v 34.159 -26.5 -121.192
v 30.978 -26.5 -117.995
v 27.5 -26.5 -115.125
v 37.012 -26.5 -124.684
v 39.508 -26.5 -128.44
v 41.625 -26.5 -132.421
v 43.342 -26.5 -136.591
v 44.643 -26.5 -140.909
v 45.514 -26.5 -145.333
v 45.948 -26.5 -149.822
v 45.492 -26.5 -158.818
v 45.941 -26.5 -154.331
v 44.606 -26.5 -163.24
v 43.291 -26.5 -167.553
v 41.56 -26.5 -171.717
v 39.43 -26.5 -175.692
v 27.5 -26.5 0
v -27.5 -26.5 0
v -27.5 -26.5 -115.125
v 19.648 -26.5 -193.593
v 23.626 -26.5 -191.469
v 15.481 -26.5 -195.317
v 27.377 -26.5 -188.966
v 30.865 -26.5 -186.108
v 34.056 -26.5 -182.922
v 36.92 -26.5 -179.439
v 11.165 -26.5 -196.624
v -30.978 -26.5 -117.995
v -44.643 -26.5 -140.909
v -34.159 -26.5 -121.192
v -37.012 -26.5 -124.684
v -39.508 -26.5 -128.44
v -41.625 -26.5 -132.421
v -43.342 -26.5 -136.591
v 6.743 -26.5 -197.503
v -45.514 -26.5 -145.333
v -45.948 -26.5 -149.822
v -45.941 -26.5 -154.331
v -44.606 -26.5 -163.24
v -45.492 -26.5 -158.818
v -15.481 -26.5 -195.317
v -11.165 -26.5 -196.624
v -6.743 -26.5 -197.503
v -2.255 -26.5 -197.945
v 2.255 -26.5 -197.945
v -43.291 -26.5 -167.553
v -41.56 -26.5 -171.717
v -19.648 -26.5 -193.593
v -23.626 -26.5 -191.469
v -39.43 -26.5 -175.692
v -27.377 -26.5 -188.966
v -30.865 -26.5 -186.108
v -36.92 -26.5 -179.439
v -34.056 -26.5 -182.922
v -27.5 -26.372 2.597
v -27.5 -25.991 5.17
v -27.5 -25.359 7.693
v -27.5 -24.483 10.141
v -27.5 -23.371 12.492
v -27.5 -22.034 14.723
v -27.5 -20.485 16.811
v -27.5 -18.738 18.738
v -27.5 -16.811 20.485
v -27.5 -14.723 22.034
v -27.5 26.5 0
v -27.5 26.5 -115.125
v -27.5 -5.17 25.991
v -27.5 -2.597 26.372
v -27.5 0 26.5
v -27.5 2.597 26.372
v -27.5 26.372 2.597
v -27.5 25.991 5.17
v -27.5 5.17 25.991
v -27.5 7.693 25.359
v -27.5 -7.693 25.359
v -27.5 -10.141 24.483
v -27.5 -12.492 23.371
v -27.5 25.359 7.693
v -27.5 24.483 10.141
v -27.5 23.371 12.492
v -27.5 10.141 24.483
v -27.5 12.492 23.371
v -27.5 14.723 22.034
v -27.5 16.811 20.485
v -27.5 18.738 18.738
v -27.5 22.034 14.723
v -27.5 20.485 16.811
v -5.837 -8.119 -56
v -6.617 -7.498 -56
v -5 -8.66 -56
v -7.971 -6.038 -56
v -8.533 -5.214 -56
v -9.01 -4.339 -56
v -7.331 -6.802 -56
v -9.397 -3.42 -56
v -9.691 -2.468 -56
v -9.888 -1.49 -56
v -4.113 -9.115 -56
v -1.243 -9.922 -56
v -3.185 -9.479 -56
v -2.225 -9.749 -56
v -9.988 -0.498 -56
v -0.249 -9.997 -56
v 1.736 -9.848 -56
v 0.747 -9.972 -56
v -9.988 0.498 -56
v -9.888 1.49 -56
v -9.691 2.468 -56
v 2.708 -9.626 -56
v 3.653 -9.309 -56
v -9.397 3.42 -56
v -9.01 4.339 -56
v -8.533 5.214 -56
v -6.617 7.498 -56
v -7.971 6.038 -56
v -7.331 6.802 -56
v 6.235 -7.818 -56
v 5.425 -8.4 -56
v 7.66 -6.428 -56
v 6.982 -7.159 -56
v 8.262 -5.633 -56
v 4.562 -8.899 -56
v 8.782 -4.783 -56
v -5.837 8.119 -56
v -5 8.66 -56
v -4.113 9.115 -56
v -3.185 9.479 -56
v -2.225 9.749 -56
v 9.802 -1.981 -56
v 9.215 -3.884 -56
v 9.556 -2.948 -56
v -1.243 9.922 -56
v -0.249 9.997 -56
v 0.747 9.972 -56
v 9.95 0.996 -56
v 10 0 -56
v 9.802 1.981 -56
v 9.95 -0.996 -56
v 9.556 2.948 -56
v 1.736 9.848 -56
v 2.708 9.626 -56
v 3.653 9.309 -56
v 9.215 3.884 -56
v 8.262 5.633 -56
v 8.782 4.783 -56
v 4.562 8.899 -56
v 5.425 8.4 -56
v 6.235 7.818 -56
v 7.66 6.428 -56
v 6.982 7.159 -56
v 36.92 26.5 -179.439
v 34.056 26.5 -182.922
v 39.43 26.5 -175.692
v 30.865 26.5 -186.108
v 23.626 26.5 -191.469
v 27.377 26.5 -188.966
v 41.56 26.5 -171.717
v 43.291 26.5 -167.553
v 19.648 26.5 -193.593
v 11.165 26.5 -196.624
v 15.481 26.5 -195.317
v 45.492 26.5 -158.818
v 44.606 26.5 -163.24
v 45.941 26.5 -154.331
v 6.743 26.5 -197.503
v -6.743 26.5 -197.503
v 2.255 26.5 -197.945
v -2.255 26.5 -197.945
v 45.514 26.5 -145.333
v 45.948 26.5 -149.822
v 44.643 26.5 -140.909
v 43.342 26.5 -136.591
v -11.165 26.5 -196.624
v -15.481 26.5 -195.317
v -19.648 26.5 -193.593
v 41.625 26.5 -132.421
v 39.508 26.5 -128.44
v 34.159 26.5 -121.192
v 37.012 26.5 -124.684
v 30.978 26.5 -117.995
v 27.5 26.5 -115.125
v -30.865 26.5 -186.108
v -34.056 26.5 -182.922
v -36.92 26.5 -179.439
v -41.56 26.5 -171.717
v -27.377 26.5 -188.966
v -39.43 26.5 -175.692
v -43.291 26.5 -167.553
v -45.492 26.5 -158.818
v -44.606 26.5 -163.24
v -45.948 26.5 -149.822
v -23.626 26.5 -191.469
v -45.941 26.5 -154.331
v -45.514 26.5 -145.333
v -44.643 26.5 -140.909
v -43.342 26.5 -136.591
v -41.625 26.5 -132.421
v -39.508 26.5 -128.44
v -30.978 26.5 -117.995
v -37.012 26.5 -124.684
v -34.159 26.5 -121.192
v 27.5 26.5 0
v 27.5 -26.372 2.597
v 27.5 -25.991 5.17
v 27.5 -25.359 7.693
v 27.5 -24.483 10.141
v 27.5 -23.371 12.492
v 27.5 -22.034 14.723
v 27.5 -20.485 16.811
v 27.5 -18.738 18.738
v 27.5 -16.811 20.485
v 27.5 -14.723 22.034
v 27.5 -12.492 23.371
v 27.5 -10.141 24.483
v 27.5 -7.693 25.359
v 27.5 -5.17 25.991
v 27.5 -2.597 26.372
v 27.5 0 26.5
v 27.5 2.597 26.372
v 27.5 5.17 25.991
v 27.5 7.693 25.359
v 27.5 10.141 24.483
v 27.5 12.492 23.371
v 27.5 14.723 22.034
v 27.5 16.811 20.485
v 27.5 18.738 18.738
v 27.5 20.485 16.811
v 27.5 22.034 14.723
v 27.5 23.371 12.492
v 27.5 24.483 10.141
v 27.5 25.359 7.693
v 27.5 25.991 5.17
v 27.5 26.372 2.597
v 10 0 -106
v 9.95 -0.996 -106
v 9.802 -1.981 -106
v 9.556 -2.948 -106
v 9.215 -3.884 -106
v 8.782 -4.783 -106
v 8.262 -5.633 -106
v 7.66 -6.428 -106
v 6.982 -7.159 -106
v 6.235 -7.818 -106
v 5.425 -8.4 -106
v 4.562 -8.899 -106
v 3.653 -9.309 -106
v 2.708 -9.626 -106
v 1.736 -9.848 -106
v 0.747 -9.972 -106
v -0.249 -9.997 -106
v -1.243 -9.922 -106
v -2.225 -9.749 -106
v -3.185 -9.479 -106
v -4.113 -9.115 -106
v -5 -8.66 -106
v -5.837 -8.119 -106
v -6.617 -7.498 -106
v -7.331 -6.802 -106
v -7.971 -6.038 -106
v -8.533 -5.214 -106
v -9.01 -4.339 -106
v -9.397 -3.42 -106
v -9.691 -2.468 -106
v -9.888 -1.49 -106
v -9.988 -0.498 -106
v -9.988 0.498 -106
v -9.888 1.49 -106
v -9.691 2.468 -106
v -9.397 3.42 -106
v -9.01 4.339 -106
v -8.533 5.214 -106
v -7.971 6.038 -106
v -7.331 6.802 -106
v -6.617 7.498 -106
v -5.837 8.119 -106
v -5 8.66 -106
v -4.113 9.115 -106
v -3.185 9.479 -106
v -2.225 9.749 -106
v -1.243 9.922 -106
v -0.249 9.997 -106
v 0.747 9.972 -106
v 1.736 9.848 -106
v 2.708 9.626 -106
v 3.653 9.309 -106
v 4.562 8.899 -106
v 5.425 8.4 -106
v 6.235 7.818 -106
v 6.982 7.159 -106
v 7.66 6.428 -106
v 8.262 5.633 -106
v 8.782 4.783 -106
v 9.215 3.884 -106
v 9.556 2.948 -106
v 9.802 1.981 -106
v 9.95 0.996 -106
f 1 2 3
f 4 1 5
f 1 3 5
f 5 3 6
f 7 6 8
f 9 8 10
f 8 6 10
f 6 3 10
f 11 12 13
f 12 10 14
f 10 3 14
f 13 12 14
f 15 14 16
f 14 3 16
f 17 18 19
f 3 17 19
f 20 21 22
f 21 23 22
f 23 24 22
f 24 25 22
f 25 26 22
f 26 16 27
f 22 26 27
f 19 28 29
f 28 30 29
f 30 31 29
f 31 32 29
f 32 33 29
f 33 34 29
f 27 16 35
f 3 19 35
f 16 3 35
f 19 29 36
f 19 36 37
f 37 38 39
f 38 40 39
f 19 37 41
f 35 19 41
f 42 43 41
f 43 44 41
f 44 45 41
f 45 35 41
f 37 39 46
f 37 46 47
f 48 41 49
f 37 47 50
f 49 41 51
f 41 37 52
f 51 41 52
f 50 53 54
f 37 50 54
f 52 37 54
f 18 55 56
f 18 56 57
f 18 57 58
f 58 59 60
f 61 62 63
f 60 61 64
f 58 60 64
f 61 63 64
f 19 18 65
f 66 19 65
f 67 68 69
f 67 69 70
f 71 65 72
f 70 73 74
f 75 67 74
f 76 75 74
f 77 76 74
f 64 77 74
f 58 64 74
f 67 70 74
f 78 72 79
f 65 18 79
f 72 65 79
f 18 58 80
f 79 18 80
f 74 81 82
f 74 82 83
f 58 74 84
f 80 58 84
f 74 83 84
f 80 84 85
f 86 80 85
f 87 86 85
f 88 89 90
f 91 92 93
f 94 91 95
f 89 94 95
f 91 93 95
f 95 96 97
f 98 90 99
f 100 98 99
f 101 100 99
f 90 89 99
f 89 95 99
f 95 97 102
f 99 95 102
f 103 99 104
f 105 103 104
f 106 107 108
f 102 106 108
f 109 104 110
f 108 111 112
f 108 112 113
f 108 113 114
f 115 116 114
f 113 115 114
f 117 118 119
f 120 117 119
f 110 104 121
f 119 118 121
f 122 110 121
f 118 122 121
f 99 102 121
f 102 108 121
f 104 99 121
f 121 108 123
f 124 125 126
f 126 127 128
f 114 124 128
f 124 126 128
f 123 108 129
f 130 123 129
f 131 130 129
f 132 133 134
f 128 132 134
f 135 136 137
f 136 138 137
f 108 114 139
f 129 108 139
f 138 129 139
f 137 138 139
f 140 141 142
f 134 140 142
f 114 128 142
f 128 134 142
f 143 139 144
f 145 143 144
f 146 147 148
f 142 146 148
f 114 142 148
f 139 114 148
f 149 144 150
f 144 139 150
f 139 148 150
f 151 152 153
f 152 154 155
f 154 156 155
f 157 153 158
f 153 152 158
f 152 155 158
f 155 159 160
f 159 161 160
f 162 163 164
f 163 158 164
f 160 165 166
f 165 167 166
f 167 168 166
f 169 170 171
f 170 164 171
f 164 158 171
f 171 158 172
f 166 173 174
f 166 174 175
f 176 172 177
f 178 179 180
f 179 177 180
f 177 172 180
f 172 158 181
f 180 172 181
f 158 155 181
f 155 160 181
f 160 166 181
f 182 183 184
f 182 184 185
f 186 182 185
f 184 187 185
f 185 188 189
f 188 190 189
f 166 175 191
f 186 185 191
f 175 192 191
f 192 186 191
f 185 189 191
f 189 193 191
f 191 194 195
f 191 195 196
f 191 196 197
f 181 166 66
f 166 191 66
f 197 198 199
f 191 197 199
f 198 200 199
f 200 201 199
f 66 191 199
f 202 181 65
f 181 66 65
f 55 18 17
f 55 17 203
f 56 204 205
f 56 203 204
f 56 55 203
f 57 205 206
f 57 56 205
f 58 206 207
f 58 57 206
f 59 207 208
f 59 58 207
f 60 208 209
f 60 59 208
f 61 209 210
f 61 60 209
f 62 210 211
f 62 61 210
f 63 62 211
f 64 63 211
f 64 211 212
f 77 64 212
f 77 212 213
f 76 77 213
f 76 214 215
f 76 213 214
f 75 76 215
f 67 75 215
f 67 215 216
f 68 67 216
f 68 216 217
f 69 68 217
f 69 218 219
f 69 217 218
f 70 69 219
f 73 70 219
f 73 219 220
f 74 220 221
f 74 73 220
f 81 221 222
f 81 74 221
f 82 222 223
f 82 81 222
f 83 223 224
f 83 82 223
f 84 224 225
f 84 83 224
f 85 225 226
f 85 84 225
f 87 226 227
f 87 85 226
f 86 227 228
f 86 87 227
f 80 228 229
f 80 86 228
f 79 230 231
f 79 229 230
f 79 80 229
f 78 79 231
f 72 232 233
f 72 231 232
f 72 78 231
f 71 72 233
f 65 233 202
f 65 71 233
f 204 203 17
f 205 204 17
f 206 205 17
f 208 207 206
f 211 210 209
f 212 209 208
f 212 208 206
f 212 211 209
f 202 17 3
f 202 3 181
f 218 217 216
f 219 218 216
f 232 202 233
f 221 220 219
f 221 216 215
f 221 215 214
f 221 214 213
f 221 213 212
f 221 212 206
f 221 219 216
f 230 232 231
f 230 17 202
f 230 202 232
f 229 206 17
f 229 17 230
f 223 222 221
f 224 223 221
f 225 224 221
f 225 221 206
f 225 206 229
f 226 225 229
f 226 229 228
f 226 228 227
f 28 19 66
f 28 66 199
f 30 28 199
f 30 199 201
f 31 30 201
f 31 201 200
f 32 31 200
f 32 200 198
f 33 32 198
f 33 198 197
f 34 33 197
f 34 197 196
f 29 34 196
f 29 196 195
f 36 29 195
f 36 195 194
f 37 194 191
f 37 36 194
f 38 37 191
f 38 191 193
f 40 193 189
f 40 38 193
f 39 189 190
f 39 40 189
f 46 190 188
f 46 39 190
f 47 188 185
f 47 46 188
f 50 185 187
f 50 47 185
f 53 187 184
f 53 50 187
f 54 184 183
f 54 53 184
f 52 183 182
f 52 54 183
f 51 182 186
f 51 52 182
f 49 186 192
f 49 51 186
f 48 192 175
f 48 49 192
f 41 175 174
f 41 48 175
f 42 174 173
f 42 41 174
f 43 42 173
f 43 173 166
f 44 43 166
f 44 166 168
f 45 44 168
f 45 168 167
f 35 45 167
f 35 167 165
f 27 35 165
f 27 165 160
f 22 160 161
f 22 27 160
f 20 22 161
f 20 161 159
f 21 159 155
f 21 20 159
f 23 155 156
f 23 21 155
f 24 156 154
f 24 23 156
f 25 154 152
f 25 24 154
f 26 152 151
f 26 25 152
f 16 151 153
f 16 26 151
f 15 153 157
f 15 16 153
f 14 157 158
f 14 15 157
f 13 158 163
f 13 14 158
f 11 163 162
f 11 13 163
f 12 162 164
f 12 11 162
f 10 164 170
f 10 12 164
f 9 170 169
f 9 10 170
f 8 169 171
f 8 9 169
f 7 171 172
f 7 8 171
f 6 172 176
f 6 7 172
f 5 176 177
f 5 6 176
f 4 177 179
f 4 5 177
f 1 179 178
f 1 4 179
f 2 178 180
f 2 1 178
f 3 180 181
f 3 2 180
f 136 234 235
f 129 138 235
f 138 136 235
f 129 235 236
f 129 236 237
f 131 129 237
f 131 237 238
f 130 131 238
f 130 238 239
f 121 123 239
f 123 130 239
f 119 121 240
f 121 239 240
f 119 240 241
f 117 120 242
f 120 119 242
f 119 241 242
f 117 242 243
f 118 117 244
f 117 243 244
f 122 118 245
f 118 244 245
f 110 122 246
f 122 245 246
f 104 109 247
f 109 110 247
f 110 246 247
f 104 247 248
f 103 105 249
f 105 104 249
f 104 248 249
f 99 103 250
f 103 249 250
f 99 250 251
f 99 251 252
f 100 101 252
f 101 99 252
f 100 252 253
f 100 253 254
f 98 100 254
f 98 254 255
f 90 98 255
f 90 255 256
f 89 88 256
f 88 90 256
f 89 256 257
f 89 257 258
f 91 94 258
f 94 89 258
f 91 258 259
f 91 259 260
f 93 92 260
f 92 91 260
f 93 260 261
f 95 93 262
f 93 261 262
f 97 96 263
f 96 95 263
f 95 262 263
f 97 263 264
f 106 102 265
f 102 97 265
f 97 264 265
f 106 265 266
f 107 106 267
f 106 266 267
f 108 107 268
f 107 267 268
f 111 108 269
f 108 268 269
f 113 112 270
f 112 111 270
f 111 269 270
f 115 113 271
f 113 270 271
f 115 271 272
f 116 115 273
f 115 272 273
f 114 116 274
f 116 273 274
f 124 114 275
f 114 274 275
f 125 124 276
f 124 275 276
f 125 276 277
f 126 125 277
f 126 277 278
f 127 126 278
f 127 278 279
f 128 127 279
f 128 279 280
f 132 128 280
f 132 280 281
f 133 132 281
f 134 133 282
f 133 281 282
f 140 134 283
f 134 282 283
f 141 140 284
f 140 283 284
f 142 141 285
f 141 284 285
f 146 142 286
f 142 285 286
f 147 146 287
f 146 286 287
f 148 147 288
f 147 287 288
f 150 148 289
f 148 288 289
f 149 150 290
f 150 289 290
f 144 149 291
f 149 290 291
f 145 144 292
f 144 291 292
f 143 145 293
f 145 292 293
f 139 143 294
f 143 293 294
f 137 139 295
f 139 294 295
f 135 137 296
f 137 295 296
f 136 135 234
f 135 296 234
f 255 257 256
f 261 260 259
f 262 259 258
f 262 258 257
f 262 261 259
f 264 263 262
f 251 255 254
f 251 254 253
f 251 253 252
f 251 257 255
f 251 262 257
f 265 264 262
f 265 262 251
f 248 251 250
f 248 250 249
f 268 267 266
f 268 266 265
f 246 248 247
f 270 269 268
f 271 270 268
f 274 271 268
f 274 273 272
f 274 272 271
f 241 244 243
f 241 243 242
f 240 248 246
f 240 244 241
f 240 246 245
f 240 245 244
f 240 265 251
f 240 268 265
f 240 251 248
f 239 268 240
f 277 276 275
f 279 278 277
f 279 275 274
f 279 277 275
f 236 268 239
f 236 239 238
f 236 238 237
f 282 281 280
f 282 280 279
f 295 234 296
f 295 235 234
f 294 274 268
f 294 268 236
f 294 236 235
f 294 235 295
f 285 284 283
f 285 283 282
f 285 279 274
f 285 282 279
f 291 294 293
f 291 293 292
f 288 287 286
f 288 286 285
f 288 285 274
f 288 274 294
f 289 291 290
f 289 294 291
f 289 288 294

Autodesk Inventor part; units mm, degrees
ref_plane "YZ Plane" through (0, 0, 0) normal (1, 0, 0) x (0, 1, 0)
ref_plane "XZ Plane" through (0, 0, 0) normal (0, 1, 0) x (-1, 0, 0)
sketch "Sketch1" plane through (0, 0, 0) normal (1, 0, 0) x (0, 1, 0)
  circle A0 centre (0, 0) radius 26.5
  line L0 (-26.5, 0) -> (-26.5, -152)
  line L1 (-26.5, -152) -> (26.5, -152)
  line L2 (26.5, -152) -> (26.5, 0)
  dimension "d0" = 53
  dimension "d1" = 152
extrude "Extrusion1" add sketch "Sketch1" along normal mid plane 55
sketch "Sketch2" plane through (0, 0, 0) normal (0, 1, 0) x (-1, 0, 0)
  line L0 (27.5, -152) -> (-27.5, -152) projected
  circle A0 centre (0, -152) radius 46
  point P0 (0, 0)
  dimension "d4" = 92
extrude "Extrusion2" add sketch "Sketch2" along normal mid plane 53
ref_plane "Work Plane1" through (0, 0, -106) normal (0, 0, 1) x (1, 0, 0)
sketch "Sketch3" plane through (0, 0, -106) normal (0, 0, 1) x (1, 0, 0)
  circle A0 centre (0, 0) radius 10
  dimension "d13" = 20
extrude "Extrusion3" cut sketch "Sketch3" along normal blind 50
properties part number "thigh"
